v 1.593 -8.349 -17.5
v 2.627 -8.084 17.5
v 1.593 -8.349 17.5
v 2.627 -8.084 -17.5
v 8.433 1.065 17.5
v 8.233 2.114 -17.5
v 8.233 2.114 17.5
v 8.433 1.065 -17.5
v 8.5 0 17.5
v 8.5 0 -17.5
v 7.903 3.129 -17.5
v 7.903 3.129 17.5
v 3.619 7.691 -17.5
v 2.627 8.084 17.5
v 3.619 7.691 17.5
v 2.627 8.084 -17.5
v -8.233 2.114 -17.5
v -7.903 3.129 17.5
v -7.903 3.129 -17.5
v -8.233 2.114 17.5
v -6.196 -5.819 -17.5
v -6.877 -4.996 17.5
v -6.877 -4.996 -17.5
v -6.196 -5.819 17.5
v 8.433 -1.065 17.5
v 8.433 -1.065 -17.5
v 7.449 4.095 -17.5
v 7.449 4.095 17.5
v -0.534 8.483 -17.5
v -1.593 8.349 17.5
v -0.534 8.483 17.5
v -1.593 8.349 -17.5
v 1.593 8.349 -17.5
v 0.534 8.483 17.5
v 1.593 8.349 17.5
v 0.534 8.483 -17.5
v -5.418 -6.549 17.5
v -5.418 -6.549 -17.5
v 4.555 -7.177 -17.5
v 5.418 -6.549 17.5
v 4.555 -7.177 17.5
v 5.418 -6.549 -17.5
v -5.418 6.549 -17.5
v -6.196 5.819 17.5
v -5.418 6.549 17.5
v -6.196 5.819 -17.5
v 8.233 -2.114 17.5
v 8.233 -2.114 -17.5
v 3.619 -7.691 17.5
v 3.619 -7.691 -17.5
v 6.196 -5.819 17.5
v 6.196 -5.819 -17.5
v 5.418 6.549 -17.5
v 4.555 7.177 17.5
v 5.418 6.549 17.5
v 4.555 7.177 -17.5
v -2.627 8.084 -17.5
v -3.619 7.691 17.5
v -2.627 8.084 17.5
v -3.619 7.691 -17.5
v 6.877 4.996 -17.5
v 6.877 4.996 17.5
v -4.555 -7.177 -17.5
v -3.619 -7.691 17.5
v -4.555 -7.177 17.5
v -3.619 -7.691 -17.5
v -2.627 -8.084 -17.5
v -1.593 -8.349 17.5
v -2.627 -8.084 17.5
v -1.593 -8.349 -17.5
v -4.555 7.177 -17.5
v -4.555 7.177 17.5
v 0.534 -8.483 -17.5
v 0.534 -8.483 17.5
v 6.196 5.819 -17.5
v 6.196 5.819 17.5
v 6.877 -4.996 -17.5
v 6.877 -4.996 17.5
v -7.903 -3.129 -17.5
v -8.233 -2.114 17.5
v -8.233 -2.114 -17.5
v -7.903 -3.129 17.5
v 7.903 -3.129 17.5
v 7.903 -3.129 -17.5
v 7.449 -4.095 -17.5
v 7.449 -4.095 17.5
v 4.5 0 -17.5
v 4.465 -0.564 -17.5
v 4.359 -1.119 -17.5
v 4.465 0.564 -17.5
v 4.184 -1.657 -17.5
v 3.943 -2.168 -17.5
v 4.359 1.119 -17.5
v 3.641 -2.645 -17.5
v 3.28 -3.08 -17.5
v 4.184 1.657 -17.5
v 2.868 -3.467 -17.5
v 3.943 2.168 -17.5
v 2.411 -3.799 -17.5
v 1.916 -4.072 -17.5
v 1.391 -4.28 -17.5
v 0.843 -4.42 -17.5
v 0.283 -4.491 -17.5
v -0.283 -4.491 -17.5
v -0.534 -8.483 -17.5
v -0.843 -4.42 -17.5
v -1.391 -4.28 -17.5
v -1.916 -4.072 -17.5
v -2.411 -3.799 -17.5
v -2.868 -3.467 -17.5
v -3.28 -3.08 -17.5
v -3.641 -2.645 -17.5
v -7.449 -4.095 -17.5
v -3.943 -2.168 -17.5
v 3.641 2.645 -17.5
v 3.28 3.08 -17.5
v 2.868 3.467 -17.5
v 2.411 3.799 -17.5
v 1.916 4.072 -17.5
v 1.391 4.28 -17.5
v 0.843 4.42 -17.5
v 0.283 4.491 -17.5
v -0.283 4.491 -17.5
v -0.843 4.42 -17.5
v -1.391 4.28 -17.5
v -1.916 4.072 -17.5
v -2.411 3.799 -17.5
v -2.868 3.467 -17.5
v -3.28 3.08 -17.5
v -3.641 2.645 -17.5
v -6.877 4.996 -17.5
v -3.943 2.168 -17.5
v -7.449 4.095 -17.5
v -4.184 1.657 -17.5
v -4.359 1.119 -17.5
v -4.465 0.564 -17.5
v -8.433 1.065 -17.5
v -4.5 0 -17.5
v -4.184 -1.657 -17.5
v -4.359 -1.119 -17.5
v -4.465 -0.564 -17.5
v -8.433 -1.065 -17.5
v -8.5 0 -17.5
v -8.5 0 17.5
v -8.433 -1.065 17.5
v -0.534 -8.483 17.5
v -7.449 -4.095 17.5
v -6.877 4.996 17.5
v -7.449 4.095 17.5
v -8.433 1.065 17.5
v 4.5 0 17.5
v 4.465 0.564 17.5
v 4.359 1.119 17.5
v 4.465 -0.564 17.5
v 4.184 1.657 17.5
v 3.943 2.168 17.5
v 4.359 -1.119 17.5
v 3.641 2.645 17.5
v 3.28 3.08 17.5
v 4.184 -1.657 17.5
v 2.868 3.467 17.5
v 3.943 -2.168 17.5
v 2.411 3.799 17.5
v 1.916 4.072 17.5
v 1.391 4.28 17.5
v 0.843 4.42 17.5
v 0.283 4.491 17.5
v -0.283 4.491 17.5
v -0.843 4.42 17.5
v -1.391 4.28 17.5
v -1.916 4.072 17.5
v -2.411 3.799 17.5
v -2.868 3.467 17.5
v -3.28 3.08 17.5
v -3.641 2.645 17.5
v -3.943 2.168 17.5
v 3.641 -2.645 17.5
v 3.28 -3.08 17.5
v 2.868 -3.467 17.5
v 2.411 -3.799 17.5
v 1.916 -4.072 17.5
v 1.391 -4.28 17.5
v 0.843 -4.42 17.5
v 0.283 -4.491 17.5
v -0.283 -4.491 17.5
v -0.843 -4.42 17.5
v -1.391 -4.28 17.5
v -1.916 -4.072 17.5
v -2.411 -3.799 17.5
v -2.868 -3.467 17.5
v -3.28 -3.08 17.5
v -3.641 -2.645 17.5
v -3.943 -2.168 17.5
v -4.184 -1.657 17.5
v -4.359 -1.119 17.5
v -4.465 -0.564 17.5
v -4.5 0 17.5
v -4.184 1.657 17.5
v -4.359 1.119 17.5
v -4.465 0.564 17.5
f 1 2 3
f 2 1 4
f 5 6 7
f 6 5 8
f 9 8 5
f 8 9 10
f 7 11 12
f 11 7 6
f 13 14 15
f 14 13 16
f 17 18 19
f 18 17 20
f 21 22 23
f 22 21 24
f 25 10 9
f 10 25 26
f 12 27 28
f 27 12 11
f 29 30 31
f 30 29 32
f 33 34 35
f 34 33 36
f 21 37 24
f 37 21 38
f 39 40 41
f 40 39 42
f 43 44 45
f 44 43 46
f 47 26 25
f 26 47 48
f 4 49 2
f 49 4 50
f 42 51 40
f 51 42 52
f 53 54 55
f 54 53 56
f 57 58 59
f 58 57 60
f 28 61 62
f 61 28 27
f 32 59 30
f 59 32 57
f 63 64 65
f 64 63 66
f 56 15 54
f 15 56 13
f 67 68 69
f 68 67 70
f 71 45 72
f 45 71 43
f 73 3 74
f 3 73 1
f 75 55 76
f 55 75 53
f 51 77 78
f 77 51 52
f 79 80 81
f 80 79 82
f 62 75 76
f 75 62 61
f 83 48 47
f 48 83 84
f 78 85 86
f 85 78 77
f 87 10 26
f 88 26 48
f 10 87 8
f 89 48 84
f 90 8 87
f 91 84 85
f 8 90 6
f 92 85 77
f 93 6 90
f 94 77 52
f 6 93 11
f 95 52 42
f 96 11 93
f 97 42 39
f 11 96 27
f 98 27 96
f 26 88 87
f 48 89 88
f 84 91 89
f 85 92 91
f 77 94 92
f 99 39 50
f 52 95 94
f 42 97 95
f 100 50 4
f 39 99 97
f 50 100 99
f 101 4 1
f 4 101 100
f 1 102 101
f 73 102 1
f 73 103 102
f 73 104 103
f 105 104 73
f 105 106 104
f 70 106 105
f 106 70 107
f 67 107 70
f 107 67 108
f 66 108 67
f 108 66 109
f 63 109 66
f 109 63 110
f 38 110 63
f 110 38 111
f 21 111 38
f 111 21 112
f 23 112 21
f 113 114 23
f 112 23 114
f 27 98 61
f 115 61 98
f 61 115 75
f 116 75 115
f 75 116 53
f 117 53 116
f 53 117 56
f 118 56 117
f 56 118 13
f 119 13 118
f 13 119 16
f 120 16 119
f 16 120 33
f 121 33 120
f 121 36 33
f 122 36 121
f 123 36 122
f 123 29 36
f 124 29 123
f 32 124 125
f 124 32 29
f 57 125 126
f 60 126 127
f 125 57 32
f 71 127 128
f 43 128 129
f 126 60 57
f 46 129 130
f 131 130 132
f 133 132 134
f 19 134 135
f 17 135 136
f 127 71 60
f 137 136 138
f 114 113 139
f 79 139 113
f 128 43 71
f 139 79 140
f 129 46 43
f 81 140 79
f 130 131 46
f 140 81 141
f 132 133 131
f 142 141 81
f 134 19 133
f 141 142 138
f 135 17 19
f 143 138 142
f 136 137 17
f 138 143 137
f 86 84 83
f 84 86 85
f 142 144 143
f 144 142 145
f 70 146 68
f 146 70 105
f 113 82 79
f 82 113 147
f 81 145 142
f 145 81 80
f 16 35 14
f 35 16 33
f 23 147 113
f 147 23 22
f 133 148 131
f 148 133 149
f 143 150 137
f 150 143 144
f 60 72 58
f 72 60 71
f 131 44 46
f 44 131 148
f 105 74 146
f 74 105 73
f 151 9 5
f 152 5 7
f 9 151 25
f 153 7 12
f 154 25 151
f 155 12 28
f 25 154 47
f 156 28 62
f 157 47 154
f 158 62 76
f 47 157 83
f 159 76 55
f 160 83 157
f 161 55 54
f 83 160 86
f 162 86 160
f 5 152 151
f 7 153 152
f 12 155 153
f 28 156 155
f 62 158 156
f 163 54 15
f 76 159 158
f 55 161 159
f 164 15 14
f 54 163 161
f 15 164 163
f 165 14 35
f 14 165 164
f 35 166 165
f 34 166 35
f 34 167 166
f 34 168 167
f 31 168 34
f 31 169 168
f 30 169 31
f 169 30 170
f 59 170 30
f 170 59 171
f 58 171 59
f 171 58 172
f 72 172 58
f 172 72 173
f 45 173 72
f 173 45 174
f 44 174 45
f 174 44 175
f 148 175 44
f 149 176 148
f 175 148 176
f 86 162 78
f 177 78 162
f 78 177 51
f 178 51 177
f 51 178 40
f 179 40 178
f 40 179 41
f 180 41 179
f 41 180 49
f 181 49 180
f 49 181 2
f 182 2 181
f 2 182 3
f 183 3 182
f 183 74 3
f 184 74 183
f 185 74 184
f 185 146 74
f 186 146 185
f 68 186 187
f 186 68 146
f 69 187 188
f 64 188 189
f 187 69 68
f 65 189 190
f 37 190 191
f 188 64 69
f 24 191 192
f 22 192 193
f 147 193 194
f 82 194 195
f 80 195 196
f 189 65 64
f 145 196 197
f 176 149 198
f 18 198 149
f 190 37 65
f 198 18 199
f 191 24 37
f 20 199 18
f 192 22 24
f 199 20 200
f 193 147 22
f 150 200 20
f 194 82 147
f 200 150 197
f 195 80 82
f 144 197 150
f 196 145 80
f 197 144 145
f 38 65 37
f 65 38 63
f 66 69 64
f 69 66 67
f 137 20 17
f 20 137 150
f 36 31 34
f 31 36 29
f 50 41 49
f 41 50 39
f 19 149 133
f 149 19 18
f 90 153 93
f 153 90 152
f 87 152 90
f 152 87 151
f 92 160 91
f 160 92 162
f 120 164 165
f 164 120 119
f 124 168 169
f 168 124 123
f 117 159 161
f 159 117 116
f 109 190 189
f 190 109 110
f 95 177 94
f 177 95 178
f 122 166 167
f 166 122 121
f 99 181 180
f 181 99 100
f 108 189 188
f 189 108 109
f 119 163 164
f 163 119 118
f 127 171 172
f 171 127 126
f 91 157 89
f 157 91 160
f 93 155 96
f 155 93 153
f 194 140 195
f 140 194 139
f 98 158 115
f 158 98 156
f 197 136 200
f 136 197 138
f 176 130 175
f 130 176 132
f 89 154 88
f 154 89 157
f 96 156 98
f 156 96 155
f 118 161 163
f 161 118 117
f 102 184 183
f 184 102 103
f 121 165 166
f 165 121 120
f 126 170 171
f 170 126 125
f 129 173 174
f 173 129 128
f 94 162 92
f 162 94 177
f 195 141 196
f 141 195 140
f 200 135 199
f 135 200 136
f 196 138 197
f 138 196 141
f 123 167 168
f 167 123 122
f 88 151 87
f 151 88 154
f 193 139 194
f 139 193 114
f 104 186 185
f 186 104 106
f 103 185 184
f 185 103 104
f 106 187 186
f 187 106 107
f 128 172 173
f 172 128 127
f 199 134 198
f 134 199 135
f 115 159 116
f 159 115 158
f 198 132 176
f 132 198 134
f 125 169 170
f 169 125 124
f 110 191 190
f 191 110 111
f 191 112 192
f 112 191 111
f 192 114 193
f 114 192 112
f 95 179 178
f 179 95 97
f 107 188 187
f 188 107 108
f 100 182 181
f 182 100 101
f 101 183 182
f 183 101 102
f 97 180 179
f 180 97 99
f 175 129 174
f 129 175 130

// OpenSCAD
$fn = 50;


difference() {
	union() {
		translate(v = [0, 0, -17.5000000000]) {
			cylinder(h = 35, r = 8.5000000000);
		}
	}
	union() {
		translate(v = [0, 0, -100.0000000000]) {
			cylinder(h = 200, r = 4.5000000000);
		}
	}
}
